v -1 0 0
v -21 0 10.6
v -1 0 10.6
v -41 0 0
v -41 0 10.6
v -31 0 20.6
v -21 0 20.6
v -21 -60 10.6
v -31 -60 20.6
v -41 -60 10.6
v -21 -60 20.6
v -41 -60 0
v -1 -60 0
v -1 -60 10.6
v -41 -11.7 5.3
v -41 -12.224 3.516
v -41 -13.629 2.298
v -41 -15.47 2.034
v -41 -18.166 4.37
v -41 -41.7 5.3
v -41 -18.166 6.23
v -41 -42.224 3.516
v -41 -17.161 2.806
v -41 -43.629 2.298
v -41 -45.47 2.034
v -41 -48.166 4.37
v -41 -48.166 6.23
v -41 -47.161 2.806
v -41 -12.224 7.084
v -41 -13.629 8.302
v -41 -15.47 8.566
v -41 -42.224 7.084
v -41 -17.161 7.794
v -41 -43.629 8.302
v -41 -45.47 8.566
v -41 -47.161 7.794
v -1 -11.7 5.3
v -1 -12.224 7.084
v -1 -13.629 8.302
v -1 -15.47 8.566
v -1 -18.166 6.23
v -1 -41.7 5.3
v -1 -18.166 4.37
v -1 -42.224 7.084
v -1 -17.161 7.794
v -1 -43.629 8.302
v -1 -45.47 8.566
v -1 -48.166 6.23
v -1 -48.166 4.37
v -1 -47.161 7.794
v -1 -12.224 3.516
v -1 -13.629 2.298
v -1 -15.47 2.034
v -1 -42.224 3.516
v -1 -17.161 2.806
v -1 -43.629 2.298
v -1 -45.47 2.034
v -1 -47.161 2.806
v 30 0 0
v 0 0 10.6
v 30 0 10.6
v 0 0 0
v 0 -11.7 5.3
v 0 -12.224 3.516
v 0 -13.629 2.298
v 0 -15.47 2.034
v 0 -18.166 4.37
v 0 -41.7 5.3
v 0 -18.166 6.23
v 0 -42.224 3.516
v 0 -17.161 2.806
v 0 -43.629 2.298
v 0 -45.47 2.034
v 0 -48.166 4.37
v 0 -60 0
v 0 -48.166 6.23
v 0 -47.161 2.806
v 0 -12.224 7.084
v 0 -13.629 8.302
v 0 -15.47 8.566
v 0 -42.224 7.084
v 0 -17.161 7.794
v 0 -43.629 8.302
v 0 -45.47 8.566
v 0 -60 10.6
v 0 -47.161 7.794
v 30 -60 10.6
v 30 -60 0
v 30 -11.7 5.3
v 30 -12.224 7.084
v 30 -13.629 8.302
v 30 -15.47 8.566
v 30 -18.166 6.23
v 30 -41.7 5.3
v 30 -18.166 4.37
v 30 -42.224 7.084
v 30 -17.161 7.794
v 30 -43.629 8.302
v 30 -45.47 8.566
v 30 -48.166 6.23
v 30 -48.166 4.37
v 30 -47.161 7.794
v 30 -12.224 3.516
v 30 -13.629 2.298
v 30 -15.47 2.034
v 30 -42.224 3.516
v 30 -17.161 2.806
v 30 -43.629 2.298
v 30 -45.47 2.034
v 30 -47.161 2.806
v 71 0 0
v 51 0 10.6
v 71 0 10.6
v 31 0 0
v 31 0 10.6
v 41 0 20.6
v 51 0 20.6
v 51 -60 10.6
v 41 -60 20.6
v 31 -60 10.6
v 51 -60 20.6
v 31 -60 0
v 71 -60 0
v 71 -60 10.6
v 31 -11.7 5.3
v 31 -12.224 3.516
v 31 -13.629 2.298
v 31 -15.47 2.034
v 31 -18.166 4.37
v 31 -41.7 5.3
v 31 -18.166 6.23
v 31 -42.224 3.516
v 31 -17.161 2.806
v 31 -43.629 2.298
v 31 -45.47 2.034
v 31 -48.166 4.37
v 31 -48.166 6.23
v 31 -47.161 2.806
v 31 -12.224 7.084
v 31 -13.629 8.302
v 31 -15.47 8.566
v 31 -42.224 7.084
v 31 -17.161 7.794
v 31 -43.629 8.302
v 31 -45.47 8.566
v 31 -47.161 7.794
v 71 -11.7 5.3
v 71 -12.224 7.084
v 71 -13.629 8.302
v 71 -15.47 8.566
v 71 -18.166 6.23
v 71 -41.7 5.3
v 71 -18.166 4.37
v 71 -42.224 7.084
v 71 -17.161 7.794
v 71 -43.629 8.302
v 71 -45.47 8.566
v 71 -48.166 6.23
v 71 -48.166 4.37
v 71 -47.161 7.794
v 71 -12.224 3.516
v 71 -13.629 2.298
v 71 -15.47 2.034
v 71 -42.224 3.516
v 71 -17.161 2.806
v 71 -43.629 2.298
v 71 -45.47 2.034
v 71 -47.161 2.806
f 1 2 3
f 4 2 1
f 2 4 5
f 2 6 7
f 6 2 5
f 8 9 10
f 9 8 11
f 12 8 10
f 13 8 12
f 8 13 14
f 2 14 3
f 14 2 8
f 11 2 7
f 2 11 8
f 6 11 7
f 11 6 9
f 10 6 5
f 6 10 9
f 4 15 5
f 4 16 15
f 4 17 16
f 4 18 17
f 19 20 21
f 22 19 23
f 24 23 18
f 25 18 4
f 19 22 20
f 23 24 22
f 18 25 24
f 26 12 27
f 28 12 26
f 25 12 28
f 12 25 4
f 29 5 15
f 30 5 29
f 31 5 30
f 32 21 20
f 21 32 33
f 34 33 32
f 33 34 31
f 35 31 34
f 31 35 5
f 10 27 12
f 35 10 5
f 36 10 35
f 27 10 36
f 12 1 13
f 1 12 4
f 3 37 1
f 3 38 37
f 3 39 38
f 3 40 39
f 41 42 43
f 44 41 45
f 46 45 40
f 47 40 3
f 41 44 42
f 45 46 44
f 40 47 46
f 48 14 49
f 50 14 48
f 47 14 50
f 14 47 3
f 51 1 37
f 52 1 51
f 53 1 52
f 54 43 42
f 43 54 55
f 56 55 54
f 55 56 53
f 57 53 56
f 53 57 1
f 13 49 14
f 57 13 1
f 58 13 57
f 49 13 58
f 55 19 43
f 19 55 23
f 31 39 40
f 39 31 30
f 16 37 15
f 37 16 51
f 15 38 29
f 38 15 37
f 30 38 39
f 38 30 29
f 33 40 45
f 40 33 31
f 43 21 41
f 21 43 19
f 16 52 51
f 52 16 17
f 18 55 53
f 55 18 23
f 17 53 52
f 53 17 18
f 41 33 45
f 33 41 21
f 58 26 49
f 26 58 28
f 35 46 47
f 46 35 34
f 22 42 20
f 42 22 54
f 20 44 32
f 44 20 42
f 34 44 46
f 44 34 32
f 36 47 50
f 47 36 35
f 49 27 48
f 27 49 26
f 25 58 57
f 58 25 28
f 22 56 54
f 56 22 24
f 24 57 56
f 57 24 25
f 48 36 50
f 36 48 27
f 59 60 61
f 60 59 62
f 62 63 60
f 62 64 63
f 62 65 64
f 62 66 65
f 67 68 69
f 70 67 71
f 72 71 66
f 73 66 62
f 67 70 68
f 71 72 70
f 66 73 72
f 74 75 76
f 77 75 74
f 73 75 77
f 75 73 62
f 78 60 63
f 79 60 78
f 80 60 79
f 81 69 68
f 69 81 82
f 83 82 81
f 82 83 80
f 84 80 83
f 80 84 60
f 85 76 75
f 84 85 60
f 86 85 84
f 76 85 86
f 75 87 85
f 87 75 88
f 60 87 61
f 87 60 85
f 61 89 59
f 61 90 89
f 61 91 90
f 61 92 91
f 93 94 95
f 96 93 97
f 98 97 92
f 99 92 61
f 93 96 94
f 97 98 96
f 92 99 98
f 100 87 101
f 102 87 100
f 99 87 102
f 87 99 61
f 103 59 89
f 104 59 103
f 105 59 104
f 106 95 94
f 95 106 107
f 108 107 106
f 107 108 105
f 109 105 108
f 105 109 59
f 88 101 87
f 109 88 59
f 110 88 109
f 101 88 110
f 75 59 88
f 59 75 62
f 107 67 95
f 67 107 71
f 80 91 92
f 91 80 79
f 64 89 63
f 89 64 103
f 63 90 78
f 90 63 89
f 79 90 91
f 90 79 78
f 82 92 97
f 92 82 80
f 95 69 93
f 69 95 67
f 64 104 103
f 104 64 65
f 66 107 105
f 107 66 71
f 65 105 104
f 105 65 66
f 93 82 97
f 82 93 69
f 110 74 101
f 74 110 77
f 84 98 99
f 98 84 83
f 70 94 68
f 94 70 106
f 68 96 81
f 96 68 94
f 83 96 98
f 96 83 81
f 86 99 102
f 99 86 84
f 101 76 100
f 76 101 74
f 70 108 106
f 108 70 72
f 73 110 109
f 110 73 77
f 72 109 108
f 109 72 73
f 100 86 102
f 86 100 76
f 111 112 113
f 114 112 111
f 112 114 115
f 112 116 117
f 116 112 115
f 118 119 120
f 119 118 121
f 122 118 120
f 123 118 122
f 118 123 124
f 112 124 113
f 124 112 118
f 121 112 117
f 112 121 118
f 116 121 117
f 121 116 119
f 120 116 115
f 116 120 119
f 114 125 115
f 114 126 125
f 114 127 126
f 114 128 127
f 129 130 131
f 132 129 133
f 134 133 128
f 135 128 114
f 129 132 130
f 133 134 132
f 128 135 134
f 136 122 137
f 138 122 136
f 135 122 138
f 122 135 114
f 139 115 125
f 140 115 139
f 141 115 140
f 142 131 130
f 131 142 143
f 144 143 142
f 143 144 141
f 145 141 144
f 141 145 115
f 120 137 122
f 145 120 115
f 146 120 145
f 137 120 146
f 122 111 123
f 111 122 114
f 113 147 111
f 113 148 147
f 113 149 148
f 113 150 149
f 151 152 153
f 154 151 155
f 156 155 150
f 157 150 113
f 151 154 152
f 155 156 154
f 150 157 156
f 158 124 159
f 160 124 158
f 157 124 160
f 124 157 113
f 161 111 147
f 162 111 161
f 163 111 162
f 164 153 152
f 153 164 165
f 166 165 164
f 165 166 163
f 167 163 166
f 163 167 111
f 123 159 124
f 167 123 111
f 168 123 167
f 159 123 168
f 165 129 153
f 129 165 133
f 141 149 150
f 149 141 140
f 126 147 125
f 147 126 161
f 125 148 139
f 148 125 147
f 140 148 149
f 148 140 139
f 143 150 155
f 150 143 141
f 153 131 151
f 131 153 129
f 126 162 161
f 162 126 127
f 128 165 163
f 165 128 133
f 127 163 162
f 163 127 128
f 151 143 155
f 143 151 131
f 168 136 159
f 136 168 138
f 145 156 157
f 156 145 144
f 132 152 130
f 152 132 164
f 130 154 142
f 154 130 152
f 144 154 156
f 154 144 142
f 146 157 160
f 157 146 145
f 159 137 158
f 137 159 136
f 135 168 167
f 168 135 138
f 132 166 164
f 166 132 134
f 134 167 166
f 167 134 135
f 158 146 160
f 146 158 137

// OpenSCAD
// Copyright (c) 2017 Adrian Weiler
// This file is licensed Creative Commons Attribution-NonCommercial-ShareAlike 4.0.
// https://creativecommons.org/licenses/by-nc-sa/4.0/

// You can get this file from http://www.thingiverse.com/thing:2736667

w=60;  // width
l=40;  // length
lm=30; // length of middle part
s=l/2; // length of support area
d=6.6; // diameter of holes, suitable for 6mm threaded rod
h=d+4; // height of support area
h1=10; // additional height
f=10;  // size of chamfer

module support(outer)
{
    rotate([90,0,0])
        difference()
        {
            // body
            linear_extrude(w)
                if (outer)
                    polygon([[0,0],[l,0],[l,h],[l-s,h],[l-s,h+h1],[f,h+h1],[0,h+h1-f]]);
                else
                    square(size=[lm,h]);

            // holes
            translate([0,h/2,w/4]) rotate([0,90,0]) cylinder(l, d=d);
            translate([0,h/2,3*w/4]) rotate([0,90,0]) cylinder(l, d=d);
        }
}

translate ([-l-1,0,0]) support(true);
support(false);
translate ([lm+1,0,0]) support(true);
